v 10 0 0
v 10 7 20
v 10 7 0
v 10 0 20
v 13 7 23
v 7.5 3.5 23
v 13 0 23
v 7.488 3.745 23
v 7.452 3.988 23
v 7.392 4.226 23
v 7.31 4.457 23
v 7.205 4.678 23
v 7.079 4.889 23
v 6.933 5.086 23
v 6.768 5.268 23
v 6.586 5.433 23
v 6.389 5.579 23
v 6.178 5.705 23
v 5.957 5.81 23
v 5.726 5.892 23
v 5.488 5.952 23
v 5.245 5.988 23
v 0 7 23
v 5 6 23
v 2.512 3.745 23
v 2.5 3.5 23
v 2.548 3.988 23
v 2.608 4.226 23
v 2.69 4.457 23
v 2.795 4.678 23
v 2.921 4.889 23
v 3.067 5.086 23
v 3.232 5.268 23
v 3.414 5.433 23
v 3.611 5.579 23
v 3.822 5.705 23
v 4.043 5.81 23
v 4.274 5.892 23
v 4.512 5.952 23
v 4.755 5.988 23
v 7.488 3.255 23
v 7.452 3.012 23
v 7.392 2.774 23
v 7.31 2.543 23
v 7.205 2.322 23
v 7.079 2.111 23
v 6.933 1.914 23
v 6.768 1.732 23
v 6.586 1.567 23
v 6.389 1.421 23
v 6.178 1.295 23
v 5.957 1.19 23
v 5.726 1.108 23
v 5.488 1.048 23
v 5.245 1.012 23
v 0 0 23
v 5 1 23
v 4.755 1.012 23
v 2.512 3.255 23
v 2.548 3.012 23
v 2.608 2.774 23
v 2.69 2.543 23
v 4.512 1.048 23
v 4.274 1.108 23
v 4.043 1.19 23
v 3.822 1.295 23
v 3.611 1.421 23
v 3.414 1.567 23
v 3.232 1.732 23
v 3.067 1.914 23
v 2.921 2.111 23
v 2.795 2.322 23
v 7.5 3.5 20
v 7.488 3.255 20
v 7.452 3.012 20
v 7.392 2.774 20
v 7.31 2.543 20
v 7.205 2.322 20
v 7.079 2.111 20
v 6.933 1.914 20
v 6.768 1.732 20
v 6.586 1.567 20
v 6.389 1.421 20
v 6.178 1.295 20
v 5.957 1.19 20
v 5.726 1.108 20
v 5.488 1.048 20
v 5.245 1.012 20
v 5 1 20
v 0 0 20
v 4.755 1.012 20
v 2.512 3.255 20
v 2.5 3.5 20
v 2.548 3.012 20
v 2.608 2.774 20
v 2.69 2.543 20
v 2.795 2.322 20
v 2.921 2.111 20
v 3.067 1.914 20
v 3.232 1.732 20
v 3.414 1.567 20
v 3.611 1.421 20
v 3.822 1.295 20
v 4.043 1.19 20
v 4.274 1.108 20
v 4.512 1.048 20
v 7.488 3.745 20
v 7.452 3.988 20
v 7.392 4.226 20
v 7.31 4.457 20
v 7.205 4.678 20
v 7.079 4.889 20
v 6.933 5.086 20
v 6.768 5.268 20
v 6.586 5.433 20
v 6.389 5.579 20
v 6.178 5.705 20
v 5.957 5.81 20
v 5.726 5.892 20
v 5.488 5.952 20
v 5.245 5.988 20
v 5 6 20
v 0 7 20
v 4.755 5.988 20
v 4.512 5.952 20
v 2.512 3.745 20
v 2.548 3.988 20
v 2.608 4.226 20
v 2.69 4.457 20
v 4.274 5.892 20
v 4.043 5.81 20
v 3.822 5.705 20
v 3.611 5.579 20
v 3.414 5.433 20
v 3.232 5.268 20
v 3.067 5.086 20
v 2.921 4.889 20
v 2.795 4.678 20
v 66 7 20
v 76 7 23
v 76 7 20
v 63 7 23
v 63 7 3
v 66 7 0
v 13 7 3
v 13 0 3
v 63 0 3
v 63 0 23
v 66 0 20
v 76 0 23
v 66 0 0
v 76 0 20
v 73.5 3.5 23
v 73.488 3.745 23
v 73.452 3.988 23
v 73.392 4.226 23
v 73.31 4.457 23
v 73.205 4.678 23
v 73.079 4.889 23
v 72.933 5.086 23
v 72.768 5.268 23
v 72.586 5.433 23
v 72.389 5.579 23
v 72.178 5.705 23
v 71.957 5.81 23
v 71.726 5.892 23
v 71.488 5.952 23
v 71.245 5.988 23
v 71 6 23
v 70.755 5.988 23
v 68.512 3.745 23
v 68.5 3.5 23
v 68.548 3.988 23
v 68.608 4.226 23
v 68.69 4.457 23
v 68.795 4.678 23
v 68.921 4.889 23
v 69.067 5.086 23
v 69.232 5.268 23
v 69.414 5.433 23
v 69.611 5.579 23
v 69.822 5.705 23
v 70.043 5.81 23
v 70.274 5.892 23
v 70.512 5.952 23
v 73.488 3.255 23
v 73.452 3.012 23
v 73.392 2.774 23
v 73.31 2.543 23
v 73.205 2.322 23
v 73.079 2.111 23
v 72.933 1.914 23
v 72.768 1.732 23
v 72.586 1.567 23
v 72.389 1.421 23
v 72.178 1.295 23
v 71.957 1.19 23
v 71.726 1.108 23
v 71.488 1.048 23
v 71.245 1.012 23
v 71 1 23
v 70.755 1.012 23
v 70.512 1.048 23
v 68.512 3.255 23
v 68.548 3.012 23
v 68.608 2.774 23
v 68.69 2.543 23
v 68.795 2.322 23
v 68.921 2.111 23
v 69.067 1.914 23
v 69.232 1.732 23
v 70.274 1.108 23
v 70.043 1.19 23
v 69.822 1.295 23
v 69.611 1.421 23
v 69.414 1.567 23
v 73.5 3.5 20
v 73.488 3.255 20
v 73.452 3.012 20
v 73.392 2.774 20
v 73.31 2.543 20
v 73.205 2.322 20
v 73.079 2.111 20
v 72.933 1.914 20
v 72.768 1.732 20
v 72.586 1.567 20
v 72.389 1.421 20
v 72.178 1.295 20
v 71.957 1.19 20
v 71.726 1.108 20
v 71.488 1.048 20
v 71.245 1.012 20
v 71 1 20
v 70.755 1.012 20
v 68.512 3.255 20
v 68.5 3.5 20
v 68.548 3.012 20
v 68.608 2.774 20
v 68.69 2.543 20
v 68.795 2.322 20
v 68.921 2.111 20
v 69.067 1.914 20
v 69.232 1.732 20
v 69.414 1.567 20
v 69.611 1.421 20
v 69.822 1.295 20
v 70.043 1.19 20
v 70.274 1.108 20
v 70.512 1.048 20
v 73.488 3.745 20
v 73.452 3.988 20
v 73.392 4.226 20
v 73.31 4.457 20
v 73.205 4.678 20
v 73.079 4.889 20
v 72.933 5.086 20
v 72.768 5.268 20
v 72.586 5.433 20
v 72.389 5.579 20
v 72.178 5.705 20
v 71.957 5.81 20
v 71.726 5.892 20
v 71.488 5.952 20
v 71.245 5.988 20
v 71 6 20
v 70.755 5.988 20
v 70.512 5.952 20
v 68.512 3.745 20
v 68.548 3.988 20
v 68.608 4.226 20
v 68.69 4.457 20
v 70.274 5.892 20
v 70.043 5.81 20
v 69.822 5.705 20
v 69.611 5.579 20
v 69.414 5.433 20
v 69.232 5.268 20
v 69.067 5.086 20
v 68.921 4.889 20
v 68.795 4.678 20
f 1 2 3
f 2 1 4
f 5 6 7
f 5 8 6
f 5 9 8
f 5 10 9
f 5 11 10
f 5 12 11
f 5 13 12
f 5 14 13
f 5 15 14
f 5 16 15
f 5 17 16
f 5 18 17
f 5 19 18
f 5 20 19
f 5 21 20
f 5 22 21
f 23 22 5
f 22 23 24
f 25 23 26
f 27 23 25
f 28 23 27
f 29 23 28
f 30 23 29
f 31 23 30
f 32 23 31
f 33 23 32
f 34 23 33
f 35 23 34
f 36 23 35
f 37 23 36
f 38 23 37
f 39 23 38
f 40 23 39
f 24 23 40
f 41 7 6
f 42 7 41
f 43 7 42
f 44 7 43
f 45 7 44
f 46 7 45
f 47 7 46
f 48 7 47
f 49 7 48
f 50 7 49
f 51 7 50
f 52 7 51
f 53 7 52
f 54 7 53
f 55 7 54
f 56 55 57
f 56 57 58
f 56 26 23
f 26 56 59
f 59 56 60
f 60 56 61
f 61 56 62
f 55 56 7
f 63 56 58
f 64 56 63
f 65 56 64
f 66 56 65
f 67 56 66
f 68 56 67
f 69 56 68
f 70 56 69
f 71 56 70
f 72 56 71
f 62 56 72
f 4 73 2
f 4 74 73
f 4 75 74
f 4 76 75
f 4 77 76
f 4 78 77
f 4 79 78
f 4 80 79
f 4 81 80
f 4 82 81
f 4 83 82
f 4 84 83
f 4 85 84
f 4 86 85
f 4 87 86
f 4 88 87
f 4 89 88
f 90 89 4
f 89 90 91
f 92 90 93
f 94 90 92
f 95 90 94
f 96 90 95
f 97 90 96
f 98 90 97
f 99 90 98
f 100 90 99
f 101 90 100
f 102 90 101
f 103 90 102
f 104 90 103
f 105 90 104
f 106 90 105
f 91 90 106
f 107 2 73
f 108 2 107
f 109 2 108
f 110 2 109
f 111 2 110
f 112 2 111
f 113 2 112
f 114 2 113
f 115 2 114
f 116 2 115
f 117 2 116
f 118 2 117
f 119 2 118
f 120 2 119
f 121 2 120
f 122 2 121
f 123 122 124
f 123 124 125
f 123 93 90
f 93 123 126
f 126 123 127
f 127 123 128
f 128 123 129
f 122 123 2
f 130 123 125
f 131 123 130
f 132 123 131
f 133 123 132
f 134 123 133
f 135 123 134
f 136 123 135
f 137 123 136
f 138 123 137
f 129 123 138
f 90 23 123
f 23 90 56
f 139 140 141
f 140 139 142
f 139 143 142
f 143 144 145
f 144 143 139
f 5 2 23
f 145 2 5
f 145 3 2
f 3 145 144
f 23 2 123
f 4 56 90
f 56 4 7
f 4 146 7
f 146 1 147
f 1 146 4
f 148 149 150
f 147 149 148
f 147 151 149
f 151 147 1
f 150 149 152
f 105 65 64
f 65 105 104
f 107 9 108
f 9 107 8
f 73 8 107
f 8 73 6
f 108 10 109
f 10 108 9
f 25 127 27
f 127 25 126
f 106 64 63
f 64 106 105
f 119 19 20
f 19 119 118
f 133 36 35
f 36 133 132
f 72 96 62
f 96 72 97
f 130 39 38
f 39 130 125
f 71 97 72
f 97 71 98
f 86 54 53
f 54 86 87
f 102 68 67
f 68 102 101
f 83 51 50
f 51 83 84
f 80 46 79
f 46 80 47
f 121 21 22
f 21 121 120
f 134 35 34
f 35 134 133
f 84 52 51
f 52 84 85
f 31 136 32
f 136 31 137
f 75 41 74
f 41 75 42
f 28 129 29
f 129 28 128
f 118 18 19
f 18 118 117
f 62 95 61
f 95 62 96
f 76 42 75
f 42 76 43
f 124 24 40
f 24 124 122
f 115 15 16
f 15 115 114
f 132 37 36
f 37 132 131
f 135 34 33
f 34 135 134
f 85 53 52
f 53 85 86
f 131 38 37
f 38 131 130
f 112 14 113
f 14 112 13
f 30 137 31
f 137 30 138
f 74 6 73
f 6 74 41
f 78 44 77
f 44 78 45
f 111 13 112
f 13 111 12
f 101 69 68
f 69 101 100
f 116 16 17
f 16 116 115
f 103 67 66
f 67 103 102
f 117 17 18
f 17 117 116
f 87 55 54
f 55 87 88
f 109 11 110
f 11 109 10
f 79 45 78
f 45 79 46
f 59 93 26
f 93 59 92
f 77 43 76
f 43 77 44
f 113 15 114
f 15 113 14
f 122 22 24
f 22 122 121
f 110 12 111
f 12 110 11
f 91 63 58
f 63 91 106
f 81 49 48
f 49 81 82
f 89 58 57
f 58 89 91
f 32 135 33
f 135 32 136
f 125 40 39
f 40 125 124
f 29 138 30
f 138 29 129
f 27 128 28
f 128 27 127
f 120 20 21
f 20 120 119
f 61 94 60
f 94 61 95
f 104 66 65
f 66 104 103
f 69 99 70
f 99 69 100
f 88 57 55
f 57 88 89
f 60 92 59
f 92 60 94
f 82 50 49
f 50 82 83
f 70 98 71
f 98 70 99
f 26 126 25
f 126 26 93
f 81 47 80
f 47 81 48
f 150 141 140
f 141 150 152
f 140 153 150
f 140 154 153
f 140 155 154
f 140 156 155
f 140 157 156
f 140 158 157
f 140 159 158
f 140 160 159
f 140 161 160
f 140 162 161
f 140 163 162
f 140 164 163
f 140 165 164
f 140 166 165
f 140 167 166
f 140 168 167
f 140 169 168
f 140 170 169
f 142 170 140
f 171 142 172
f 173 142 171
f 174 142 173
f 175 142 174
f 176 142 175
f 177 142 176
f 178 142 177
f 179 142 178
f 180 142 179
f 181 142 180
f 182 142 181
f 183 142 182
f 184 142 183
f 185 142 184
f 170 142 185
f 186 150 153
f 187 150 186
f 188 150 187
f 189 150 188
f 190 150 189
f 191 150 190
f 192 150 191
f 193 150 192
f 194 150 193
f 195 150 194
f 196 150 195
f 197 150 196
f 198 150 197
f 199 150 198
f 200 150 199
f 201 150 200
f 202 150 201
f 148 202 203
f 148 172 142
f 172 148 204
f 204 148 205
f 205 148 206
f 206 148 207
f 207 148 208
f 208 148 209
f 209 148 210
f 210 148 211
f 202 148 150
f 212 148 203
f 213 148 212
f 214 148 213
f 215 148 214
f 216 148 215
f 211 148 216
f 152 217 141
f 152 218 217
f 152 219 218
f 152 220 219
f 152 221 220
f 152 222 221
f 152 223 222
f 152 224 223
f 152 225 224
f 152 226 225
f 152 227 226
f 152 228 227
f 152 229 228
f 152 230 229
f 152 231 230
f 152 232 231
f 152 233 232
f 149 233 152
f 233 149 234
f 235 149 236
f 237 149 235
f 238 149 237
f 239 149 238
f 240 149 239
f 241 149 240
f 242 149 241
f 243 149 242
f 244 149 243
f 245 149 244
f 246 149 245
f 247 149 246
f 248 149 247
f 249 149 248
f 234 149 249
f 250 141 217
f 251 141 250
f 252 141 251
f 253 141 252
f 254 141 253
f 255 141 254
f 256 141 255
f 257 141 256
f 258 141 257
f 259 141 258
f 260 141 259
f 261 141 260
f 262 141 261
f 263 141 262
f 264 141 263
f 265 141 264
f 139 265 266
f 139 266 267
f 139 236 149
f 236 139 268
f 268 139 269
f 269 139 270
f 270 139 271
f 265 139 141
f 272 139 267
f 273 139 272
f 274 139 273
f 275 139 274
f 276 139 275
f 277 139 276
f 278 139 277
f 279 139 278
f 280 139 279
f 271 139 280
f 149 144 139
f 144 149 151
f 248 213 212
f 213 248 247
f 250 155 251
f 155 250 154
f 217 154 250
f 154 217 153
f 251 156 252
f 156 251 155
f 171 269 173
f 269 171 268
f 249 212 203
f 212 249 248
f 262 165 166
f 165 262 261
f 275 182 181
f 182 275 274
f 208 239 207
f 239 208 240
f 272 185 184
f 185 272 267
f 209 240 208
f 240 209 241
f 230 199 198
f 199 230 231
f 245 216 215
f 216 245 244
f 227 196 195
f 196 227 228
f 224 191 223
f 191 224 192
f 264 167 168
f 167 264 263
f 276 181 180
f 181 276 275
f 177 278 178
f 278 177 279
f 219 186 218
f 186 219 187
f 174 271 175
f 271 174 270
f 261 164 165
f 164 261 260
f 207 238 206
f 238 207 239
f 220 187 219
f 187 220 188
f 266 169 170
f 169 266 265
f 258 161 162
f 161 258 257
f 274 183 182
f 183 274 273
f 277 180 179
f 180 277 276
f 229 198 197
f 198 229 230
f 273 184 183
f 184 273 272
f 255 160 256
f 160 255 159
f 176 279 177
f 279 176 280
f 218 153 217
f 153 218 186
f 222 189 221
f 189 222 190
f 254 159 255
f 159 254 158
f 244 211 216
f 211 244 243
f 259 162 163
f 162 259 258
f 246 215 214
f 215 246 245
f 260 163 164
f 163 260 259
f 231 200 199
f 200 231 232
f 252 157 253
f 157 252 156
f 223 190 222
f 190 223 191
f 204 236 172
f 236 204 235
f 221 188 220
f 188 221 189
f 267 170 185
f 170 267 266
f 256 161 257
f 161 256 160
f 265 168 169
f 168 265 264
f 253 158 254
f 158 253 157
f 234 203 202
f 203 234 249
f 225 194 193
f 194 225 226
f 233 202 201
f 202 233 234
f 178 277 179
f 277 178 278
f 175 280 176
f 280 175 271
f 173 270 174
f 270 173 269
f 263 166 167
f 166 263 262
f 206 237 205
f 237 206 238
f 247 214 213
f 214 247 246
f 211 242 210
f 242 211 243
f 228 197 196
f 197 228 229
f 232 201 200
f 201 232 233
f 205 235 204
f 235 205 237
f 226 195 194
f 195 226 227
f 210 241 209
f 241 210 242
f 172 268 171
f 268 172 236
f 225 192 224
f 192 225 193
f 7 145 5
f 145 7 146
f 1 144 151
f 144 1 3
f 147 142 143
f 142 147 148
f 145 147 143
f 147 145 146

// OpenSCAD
// 
// ===============================================================================
//  AUTHOR        : Jose Lopez, JoLoCity
//  DATE          : 12/14/2018
//  DESCRIPTION   : Parametric U Bracket
//  VERSION       : 1.0
// ===============================================================================

width = 50;
height= 20;
thickness = 3;

left_wing_width = 10;
left_wing_height = thickness;

left_column_width = thickness;
left_column_height = height+thickness;

right_wing_width = 10;
right_wing_height = thickness;

right_column_width = thickness;
right_column_height = height+thickness;

bottom_width = width;
bottom_height = thickness;

depth = 7;
hole_size = 5;
resolution = 64;



// main

union() {
    Wing(left_wing_width, left_wing_height, depth, hole_size, 0, left_column_height, "lightgreen");

    //left 
    Side(left_column_width, left_column_height, depth, left_wing_width, 0, "green"); 
    
    //right
    Side(right_column_width, right_column_height, depth, left_wing_width+left_column_width+width, 0, "yellow"); 
    
    //bottom
    Side(width, bottom_height, depth, left_wing_width+left_column_width, 0, "cyan"); 

    Wing(right_wing_width, right_wing_height, depth, hole_size, left_wing_width+left_column_width+width+right_column_width, right_column_height, "red");

}

module Wing(w, h, d, hs, x, z, c) {
    // left wing
    difference () {
        color(c)
            translate([x,0,z-h])
                cube([w,d,h]);

        translate([(w/2)+x, depth/2, (z+1)/2])
            cylinder(h=z+1, d=hs, center=true, $fn=resolution);
    }
}

module Side(w, h, d, x, z, c) {
    color(c)
        translate([x,0,z])
            cube([w,d,h]);    
}
